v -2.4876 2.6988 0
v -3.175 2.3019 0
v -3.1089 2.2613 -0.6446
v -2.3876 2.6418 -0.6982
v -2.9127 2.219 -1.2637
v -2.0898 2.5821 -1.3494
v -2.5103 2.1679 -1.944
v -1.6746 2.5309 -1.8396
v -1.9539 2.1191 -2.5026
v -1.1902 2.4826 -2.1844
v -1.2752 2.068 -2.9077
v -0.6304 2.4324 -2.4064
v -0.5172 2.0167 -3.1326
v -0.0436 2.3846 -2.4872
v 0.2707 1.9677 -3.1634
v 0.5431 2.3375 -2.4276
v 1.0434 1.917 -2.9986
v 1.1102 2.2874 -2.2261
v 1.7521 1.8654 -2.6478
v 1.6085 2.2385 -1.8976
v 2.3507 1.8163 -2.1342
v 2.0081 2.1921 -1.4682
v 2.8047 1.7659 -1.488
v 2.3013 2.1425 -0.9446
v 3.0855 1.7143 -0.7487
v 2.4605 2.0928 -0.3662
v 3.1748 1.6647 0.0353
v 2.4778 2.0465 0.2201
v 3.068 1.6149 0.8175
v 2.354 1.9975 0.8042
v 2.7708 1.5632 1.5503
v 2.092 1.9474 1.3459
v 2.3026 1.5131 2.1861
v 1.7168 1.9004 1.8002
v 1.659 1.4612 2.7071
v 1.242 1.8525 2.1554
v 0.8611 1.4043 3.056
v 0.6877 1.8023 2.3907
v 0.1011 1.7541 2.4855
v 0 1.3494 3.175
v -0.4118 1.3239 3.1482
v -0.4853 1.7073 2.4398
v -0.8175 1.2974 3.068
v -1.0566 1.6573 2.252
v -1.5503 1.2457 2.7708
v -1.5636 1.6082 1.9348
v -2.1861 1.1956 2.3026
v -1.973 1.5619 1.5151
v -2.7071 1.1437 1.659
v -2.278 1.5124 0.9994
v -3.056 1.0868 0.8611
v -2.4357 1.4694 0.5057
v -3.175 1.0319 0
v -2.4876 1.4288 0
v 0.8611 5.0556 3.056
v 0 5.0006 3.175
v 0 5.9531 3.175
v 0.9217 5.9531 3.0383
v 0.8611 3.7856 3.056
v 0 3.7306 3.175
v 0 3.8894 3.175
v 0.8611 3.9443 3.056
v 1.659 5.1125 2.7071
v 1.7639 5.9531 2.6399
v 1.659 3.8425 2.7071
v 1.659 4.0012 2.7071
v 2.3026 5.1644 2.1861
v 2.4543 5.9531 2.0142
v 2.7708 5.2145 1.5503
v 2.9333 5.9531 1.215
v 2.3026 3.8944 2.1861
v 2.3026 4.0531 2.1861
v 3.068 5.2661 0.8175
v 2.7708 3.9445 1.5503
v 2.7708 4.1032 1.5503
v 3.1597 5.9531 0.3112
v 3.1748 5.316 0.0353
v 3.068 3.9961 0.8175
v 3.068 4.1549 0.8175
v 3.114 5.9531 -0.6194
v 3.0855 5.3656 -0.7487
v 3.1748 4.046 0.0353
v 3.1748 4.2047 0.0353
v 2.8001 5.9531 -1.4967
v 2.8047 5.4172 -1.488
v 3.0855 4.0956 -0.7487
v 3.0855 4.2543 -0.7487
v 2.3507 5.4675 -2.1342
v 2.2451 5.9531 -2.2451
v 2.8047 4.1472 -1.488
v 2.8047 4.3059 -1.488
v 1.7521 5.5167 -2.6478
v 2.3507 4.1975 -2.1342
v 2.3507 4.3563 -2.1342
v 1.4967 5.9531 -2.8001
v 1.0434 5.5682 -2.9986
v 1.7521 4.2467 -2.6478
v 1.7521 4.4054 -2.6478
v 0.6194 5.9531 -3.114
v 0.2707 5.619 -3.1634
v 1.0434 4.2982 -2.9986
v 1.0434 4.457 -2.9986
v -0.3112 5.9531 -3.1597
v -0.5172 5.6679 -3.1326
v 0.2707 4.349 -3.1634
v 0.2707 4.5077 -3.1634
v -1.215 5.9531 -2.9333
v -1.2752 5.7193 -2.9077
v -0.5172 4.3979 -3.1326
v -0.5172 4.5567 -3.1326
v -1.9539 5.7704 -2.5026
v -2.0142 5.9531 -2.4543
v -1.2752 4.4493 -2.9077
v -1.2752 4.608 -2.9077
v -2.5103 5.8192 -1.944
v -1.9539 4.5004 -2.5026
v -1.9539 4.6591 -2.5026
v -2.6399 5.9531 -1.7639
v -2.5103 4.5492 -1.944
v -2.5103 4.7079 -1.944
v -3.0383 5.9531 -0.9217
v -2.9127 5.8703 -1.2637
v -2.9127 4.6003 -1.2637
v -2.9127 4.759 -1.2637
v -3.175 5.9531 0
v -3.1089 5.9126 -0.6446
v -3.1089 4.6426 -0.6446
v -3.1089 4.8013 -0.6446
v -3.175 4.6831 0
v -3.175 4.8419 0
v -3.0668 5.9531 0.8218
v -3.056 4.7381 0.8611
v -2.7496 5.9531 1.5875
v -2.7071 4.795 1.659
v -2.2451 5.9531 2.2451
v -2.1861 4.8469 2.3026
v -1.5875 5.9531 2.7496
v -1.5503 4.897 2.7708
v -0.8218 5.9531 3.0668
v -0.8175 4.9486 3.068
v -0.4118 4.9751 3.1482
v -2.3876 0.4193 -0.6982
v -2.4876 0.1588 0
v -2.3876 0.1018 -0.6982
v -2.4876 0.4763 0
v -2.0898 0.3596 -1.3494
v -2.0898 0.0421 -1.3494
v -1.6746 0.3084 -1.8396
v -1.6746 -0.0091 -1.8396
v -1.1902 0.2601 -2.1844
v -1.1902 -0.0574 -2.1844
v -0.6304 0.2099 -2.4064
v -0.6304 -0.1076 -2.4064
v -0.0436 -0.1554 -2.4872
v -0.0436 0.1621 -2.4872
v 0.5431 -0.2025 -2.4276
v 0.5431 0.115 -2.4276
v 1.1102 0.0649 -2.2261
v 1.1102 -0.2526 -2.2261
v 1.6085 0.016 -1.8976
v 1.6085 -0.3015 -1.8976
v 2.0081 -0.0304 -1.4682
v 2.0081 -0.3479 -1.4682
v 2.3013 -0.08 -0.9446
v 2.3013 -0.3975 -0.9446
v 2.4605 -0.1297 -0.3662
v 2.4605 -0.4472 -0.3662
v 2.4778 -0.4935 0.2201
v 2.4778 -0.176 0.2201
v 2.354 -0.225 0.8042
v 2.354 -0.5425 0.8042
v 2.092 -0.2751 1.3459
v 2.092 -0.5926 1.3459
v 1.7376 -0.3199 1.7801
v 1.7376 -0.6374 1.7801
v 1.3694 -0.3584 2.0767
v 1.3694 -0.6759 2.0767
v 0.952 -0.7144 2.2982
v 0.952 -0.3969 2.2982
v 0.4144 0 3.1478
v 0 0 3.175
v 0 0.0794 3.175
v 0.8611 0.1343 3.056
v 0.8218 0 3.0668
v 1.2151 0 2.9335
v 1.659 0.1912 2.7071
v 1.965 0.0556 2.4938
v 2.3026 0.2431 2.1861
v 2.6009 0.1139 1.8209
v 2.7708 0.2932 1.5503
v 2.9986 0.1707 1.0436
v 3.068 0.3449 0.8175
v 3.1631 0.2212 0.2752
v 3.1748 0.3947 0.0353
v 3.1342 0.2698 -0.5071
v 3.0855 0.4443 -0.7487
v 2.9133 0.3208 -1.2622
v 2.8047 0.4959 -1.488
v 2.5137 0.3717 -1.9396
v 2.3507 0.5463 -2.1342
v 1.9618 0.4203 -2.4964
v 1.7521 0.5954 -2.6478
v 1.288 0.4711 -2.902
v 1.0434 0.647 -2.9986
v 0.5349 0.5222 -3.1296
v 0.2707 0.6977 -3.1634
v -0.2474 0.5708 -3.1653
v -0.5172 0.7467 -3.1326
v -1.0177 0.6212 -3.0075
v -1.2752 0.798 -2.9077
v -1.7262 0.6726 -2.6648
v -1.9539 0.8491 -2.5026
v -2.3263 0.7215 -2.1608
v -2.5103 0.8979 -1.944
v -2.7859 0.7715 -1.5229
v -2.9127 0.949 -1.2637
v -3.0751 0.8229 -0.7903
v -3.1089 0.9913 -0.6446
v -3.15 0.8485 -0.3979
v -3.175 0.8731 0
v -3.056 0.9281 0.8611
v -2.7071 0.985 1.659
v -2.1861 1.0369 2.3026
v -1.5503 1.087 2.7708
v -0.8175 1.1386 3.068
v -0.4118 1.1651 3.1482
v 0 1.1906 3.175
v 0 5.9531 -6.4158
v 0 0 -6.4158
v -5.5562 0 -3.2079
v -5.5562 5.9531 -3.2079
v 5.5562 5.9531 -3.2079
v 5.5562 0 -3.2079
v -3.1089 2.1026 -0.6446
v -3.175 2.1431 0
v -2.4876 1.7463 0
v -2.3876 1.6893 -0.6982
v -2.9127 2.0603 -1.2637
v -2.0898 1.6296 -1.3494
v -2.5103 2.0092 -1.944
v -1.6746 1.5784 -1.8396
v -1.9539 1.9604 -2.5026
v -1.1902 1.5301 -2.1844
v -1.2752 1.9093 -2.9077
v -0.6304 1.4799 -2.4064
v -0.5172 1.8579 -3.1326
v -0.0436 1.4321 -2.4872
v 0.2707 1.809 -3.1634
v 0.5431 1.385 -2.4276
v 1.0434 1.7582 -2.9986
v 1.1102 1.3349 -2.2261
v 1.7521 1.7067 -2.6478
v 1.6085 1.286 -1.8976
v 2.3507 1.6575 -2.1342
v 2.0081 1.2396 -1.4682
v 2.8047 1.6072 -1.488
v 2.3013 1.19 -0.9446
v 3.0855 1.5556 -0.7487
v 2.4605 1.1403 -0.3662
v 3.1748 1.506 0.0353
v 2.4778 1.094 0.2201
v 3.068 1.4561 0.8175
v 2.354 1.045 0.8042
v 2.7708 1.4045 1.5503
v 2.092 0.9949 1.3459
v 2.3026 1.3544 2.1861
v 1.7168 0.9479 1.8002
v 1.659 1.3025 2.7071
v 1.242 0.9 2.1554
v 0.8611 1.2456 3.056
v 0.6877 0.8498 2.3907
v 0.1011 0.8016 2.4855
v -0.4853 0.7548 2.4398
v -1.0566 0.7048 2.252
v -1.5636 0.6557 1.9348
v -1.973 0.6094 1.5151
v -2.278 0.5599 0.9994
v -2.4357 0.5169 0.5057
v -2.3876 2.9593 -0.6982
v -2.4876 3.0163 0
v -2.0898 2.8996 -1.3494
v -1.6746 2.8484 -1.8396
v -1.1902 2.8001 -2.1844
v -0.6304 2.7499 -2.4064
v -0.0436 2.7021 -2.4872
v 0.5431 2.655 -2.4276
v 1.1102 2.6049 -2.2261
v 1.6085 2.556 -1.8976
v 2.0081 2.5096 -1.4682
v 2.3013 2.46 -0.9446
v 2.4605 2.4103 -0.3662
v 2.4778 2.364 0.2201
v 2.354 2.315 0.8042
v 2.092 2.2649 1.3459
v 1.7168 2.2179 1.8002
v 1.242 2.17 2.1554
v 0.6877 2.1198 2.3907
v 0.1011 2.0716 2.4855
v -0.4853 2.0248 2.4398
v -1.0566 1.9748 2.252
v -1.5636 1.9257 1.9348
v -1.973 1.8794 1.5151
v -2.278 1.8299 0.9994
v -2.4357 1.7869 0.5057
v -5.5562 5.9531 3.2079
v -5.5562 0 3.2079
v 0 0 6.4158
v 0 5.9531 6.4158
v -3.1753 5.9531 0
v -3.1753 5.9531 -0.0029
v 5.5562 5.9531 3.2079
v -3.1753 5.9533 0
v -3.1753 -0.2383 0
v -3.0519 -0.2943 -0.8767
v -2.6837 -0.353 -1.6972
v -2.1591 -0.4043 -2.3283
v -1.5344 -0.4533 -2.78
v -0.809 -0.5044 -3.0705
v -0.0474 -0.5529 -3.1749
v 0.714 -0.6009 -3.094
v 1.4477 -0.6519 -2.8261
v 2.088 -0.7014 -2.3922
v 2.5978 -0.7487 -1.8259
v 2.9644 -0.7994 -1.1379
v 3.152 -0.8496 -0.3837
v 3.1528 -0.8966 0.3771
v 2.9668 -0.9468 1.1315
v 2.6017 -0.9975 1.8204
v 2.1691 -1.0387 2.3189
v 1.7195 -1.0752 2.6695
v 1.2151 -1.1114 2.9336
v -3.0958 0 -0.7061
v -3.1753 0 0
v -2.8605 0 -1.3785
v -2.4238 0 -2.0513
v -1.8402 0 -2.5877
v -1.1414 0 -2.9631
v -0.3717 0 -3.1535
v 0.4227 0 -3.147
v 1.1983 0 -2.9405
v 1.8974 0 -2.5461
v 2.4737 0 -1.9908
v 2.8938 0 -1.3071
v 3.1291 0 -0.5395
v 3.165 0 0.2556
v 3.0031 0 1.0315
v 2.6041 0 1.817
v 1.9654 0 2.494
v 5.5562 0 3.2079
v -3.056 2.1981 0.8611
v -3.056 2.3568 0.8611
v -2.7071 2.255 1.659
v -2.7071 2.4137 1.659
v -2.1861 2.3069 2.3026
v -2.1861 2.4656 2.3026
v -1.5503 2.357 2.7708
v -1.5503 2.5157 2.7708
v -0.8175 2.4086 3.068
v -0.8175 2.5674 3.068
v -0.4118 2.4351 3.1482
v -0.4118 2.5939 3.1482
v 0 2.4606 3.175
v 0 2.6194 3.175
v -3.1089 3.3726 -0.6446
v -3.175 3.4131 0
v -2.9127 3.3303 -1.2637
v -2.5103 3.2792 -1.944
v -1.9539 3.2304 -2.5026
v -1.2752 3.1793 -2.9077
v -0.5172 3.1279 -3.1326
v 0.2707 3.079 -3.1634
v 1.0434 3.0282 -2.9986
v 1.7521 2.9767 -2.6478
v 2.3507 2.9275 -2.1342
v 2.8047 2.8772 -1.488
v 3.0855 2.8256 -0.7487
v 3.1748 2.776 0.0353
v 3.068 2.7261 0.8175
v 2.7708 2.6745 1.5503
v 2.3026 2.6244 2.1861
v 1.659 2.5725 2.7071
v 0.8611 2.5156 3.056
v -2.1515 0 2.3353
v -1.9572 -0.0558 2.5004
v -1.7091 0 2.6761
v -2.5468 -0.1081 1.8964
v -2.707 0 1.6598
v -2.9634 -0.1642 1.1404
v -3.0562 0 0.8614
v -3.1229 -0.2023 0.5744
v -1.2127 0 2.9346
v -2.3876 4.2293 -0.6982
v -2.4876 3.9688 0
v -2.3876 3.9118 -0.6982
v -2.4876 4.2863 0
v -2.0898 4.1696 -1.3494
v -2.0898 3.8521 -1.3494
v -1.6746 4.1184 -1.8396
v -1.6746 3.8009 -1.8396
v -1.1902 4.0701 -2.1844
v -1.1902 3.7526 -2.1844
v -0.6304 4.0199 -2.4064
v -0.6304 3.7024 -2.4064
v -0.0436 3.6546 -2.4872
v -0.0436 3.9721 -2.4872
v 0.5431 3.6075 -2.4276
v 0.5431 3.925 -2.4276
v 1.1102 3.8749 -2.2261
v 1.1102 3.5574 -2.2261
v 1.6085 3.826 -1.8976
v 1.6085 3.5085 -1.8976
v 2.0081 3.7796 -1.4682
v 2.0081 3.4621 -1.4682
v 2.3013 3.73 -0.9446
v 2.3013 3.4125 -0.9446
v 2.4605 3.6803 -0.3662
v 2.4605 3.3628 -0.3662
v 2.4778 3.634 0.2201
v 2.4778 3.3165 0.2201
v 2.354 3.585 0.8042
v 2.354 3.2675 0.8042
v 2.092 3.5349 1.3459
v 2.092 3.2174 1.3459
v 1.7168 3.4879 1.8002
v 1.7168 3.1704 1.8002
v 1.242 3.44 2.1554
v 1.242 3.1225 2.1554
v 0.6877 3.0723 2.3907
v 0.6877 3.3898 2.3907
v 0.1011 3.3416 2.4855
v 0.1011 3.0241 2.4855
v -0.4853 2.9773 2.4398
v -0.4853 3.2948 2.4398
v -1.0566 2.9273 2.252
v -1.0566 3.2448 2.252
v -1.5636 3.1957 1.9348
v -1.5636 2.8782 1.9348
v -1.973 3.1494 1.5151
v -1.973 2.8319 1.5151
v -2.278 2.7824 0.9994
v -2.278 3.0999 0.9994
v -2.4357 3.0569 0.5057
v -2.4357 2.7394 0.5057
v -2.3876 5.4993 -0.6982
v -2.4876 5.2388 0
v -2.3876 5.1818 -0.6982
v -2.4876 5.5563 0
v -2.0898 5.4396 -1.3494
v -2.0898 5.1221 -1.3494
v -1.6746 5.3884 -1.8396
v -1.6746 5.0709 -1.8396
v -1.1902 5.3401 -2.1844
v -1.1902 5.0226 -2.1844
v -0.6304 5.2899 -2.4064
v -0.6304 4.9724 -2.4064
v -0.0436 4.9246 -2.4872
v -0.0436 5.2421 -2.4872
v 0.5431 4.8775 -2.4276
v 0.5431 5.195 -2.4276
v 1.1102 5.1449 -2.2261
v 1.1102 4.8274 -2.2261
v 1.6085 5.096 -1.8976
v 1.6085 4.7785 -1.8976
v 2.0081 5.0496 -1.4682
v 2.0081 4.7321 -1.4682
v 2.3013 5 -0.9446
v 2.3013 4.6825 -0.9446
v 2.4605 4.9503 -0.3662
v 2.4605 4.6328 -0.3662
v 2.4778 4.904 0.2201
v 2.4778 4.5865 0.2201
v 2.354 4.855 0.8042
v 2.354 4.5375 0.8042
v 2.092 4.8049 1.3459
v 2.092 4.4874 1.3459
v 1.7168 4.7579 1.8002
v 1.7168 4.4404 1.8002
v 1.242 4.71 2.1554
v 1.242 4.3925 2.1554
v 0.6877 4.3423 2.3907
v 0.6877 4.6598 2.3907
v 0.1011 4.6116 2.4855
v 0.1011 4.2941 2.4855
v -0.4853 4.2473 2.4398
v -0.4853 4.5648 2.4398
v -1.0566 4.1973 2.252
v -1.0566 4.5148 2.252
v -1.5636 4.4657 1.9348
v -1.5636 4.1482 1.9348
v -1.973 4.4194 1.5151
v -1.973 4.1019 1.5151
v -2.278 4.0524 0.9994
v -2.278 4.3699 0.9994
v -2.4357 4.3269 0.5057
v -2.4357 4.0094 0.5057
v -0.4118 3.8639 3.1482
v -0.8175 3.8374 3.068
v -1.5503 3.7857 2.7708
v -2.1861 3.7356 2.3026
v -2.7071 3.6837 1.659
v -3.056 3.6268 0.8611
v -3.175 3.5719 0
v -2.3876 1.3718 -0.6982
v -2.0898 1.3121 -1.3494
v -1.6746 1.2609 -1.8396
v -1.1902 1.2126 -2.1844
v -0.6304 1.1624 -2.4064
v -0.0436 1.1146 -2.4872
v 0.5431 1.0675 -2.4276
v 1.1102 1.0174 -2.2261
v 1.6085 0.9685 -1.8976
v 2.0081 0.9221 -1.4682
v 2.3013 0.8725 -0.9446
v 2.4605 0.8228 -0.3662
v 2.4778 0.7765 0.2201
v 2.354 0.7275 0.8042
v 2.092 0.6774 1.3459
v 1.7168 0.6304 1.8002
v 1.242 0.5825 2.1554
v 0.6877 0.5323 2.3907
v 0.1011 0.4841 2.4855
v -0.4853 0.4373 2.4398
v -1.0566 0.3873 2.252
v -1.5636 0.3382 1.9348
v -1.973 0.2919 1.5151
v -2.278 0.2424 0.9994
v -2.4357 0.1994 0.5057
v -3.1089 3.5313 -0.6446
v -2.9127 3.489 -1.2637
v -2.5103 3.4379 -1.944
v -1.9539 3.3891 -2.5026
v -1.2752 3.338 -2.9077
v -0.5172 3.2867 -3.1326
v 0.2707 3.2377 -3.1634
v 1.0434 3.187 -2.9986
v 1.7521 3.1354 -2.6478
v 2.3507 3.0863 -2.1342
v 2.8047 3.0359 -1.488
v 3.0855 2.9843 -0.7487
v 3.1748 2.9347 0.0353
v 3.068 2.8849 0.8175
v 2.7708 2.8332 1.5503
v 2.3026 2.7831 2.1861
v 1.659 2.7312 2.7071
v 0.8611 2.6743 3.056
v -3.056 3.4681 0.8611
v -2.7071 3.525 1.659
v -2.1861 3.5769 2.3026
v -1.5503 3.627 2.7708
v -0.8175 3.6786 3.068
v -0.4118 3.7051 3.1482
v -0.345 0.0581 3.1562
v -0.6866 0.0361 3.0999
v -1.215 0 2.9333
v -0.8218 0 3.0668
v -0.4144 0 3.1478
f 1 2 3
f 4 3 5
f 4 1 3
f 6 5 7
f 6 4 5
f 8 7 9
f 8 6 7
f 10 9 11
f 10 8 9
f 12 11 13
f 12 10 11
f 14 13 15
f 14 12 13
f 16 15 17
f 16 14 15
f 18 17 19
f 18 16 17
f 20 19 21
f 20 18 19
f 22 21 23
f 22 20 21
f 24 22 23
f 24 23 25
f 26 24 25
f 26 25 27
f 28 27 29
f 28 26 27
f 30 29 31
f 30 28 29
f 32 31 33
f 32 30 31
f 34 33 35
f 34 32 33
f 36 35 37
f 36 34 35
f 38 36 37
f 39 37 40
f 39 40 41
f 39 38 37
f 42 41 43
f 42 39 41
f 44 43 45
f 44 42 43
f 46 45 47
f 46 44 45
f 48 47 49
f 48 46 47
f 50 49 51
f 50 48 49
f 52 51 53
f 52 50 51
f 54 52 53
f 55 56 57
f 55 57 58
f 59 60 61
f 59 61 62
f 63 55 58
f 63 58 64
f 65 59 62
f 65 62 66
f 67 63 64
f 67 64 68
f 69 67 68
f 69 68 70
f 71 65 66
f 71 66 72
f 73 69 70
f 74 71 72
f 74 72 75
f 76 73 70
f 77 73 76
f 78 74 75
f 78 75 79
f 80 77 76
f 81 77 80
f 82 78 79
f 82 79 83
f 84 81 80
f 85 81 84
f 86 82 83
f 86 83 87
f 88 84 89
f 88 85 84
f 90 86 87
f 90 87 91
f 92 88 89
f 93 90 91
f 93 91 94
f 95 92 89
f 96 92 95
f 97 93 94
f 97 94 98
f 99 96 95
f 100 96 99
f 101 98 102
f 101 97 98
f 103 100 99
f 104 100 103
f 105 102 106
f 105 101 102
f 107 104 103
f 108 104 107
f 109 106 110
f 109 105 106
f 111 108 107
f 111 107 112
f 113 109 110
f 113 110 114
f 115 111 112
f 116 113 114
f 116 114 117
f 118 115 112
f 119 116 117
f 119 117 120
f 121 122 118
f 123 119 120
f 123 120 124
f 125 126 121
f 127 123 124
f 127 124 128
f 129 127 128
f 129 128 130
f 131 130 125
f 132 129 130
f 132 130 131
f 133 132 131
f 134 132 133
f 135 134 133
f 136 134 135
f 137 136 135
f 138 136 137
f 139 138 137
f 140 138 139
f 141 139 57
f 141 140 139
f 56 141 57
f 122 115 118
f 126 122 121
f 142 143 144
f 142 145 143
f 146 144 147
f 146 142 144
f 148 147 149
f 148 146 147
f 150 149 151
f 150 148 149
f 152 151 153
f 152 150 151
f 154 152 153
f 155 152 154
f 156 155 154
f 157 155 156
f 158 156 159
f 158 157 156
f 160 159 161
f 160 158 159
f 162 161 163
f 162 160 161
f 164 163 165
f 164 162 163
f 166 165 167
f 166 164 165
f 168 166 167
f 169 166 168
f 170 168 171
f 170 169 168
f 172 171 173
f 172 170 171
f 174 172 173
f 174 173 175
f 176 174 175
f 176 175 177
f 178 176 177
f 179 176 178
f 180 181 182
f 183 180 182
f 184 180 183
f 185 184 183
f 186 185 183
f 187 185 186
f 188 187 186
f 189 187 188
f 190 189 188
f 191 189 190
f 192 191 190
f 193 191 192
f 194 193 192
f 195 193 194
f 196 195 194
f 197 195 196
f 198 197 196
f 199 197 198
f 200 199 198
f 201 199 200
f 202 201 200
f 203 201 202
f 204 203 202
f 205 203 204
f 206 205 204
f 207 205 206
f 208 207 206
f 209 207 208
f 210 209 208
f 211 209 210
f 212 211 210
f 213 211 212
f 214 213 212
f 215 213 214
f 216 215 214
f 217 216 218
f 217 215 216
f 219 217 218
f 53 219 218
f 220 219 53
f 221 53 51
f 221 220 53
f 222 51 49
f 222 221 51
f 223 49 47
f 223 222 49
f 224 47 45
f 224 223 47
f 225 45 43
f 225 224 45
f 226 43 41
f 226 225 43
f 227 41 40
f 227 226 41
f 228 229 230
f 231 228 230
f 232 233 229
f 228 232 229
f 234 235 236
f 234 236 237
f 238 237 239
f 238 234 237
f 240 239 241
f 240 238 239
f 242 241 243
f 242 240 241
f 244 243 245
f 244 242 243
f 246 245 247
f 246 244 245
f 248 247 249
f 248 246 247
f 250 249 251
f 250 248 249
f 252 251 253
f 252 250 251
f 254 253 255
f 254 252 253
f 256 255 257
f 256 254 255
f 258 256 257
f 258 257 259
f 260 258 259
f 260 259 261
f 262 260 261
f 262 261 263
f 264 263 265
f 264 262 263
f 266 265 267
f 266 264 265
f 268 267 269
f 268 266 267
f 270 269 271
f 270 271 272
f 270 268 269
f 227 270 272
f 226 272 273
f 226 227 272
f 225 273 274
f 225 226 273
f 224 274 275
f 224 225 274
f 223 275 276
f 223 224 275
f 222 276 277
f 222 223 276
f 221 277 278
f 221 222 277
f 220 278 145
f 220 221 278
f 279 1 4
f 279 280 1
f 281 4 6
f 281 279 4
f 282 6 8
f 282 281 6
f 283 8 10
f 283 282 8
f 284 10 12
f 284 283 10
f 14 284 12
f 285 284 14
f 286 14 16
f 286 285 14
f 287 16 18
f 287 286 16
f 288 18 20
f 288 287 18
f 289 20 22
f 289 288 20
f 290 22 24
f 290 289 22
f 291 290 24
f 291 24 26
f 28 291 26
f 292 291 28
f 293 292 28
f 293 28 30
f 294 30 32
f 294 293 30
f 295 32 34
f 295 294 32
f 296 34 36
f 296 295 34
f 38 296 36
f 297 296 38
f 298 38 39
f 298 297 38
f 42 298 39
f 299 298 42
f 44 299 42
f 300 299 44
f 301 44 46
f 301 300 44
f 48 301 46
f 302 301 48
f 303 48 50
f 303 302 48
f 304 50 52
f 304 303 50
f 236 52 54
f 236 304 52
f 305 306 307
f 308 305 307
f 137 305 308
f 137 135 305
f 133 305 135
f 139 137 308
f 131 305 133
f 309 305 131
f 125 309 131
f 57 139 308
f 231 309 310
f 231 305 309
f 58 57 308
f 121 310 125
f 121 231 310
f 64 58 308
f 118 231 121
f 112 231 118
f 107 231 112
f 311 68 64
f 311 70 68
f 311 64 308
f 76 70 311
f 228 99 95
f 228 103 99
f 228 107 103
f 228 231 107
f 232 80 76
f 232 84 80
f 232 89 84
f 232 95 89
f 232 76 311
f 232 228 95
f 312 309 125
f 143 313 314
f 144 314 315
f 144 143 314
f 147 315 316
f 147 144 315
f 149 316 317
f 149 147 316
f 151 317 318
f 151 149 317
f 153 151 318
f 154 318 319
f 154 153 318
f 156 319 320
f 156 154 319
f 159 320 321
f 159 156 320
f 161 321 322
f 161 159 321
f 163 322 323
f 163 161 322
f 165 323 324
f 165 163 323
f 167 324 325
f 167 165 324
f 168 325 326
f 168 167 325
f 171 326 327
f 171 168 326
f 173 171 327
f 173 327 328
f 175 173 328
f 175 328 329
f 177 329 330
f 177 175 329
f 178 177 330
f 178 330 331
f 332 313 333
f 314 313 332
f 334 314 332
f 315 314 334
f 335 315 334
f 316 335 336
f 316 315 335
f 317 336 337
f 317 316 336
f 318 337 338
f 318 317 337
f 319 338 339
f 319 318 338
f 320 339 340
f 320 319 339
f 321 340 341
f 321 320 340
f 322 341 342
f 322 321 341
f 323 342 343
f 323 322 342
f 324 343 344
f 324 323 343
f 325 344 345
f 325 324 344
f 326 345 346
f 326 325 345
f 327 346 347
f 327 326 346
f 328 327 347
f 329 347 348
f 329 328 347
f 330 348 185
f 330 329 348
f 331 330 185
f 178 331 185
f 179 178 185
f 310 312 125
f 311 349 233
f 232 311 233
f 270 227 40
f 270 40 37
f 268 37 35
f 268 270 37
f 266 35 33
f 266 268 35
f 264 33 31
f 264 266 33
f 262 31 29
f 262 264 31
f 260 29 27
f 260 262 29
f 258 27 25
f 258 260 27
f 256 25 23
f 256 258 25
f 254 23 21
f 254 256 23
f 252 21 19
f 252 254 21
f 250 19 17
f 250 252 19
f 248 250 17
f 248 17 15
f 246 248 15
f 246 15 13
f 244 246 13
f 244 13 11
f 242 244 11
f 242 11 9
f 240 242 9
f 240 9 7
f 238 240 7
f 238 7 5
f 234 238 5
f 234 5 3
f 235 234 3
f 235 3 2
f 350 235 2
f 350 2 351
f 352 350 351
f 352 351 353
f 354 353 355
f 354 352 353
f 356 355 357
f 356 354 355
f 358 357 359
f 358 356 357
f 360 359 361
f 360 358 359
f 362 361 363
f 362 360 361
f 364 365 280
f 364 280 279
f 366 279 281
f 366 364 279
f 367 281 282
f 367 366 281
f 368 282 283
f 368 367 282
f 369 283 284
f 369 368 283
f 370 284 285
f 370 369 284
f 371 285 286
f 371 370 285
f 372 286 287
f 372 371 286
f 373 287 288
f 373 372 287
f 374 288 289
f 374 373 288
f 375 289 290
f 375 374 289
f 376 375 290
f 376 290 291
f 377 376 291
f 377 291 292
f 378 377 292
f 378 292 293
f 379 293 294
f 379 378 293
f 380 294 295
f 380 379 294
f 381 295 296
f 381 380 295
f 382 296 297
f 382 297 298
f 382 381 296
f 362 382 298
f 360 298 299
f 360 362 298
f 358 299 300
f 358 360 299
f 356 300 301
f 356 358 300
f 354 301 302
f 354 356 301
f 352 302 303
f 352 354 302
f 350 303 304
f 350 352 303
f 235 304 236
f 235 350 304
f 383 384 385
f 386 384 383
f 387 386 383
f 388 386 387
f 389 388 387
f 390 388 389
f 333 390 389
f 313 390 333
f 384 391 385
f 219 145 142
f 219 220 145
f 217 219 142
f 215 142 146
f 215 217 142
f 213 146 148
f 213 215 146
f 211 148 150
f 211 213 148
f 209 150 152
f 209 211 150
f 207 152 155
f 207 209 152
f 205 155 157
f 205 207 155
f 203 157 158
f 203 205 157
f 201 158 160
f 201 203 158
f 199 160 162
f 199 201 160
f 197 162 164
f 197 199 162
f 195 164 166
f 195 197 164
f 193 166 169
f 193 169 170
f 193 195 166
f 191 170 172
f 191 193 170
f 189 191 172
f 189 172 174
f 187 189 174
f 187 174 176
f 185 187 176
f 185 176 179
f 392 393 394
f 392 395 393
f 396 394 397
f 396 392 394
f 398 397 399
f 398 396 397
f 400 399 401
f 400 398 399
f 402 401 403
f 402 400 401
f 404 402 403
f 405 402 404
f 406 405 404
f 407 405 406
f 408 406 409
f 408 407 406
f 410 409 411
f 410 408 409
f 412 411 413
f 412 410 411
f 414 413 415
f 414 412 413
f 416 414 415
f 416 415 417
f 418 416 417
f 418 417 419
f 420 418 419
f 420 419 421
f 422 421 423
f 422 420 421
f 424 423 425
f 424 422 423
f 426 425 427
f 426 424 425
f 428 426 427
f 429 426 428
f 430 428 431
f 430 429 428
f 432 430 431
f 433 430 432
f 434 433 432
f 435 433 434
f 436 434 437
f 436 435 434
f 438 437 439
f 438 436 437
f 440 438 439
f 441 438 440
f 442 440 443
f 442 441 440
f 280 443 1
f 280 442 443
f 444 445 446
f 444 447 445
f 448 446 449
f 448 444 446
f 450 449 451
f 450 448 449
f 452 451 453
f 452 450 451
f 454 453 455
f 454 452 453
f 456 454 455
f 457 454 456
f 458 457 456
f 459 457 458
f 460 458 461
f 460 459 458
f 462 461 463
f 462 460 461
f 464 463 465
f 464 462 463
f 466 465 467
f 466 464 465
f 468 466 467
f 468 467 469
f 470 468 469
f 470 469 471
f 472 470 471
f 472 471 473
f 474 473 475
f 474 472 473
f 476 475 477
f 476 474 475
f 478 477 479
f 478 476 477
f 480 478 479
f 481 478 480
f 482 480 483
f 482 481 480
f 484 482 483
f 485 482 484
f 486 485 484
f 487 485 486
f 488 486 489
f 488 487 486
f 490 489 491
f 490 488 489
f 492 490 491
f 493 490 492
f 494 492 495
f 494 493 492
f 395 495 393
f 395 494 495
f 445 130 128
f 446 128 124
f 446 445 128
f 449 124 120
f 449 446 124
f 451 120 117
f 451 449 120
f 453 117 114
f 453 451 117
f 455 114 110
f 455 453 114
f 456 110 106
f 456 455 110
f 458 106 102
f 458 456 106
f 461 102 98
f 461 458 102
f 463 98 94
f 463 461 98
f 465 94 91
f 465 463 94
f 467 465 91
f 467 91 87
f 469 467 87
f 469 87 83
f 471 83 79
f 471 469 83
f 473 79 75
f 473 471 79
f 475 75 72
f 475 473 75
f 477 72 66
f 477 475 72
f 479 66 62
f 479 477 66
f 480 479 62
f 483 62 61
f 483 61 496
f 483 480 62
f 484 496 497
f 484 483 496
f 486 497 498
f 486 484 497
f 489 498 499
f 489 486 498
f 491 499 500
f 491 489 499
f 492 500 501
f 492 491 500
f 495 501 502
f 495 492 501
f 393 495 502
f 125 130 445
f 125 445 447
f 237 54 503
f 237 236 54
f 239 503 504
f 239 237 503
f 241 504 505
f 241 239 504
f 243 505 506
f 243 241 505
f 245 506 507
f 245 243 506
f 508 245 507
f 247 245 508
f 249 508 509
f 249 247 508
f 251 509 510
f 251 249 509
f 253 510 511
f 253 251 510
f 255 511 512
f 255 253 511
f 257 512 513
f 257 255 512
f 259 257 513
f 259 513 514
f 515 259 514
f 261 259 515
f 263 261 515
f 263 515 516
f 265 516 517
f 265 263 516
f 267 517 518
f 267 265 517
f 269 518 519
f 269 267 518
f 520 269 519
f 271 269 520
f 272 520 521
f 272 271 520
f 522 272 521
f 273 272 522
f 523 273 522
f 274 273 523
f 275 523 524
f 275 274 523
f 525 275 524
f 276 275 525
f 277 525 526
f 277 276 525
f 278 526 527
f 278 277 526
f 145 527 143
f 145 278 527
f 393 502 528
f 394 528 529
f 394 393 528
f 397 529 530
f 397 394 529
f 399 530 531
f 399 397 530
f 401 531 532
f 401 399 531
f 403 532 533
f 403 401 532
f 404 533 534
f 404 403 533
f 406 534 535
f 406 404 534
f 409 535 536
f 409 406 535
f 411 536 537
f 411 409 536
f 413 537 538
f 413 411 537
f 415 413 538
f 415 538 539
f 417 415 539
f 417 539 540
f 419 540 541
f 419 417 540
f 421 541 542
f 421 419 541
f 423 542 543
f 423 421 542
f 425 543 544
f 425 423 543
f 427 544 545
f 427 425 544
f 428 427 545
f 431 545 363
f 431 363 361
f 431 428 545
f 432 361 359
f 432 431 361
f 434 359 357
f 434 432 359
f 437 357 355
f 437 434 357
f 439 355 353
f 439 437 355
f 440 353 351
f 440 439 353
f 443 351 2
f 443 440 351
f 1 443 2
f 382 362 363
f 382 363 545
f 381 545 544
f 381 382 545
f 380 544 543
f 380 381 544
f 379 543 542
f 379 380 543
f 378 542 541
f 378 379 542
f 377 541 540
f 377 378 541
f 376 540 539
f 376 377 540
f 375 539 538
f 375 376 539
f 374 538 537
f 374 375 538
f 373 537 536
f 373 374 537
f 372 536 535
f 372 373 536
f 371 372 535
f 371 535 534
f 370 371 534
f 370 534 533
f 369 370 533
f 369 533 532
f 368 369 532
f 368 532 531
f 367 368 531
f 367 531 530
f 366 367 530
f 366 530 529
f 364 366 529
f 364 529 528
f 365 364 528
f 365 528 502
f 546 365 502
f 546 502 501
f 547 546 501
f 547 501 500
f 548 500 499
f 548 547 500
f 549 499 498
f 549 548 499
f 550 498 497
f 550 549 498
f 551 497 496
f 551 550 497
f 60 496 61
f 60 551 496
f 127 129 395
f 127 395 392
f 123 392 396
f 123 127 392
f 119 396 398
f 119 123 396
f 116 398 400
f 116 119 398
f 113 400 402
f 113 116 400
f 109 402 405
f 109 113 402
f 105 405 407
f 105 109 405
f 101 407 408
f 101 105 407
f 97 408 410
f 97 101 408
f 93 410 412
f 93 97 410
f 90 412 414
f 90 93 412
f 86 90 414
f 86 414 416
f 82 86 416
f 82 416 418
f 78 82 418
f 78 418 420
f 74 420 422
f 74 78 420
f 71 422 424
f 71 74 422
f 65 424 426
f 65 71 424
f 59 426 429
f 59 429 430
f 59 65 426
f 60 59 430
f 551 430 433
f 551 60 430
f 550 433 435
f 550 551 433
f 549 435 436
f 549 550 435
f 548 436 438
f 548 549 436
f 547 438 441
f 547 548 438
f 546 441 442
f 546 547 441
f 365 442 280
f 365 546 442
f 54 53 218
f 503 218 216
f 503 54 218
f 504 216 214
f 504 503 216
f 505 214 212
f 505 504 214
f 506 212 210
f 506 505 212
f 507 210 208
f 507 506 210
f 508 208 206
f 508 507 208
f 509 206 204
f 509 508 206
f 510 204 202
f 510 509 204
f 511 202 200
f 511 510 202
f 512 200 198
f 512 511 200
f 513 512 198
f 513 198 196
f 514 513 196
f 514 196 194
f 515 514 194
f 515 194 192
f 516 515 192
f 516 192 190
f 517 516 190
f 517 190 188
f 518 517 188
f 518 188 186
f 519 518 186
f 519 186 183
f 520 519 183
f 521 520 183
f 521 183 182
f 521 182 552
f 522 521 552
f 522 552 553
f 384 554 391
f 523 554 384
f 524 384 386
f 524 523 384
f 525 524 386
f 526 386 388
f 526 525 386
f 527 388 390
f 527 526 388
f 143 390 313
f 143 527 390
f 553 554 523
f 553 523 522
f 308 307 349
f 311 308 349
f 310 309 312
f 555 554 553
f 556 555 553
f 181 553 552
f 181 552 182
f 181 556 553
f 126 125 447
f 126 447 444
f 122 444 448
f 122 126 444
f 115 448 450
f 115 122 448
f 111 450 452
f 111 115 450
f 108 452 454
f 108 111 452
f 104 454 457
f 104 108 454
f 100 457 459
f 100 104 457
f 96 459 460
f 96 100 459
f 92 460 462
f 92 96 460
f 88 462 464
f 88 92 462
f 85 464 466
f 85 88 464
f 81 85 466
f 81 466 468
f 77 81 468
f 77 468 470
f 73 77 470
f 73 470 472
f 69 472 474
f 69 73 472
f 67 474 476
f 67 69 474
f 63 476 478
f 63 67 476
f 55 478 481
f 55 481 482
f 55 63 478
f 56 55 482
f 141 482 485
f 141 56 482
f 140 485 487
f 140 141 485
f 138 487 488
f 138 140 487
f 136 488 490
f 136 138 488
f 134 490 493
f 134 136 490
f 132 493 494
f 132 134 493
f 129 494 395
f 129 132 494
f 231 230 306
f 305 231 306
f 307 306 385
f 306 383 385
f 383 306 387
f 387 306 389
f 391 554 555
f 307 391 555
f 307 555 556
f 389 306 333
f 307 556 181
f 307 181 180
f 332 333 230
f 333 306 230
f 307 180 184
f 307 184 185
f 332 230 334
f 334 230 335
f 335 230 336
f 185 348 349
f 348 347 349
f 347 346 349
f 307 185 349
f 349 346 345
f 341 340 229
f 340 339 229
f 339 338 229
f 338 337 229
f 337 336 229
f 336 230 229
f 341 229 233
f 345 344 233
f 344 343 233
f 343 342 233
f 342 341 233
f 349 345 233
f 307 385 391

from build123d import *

# Parameters (mm, degrees)
SKETCH1_R           = 3.175
BOSS_EXTRUDE1_DEPTH = 5.953125
THREAD1_PITCH       = 1.27


with BuildPart() as part:
    # Sketch1 → Boss-Extrude1 (new body)
    with BuildSketch(Plane(origin=(0, 0, 0), x_dir=(1, 0, 0), z_dir=(0, 1, 0))):
        Polygon((0, 6.415804866), (-5.55625, 3.207902433), (-5.55625, -3.207902433), (0, -6.415804866), (5.55625, -3.207902433), (5.55625, 3.207902433), align=None)
        with Locations(Location((0, 0, 0), (0, 0, 270))):
            Circle(SKETCH1_R, mode=Mode.SUBTRACT)
    extrude(amount=BOSS_EXTRUDE1_DEPTH)

    # Thread1: the profile of Thread Profile1 profile screwed along a right-hand helix of 4.6875 turns, 8 arcs to a turn; built about Z, then put on its axis
    thread1_z = Axis((0, 0, 0), (0, 0, 1))
    thread1_corners = [(3.1753, 0, -0.000173205), (3.1753, 0, 1.111423202), (2.487592339, 0, 0.714374998), (2.487592339, 0, 0.396874998)]
    with BuildLine(mode=Mode.PRIVATE) as thread1_profile:
        Line(thread1_corners[0], thread1_corners[1])
        Line(thread1_corners[1], thread1_corners[2])
        Line(thread1_corners[2], thread1_corners[3])
        Line(thread1_corners[3], thread1_corners[0])
    thread1_cap = Face(thread1_profile.wire())
    thread1_turn_angles = [0, 22.5, 45, 67.5, 90, 112.5, 135, 157.5, 180, 202.5, 225, 247.5, 270, 292.5, 315, 337.5, 360]
    thread1_turn_weights = [1, 0.9238795325112867, 1, 0.9238795325112867, 1, 0.9238795325112867, 1, 0.9238795325112867, 1, 0.9238795325112867, 1, 0.9238795325112867, 1, 0.9238795325112867, 1, 0.9238795325112867, 1]
    thread1_turn_rails = [Edge.make_bspline([Vector(p[0], p[1], 0).rotate(thread1_z, thread1_turn_angles[k]) / thread1_turn_weights[k] + Vector(0, 0, p[2] + THREAD1_PITCH * thread1_turn_angles[k] / 360) for k in range(17)], [0, 0, 0, 1, 1, 2, 2, 3, 3, 4, 4, 5, 5, 6, 6, 7, 7, 8, 8, 8], 2, thread1_turn_weights) for p in thread1_corners]
    thread1_turn_sides = [Face.make_surface_from_curves(thread1_turn_rails[p[0]], thread1_turn_rails[p[1]]) for p in [(0, 1), (1, 2), (2, 3), (3, 0)]]
    thread1_last_angles = [1440, 1462.5, 1485, 1507.5, 1530, 1552.5, 1575, 1597.5, 1620, 1642.5, 1665, 1676.25, 1687.5]
    thread1_last_weights = [1, 0.9238795325112867, 1, 0.9238795325112867, 1, 0.9238795325112867, 1, 0.9238795325112867, 1, 0.9238795325112867, 1, 0.9807852804032304, 1]
    thread1_last_rails = [Edge.make_bspline([Vector(p[0], p[1], 0).rotate(thread1_z, thread1_last_angles[k]) / thread1_last_weights[k] + Vector(0, 0, p[2] + THREAD1_PITCH * thread1_last_angles[k] / 360) for k in range(13)], [0, 0, 0, 1, 1, 2, 2, 3, 3, 4, 4, 5, 5, 6, 6, 6], 2, thread1_last_weights) for p in thread1_corners]
    thread1_last_sides = [Face.make_surface_from_curves(thread1_last_rails[p[0]], thread1_last_rails[p[1]]) for p in [(0, 1), (1, 2), (2, 3), (3, 0)]]
    thread1 = Plane(origin=(0, 5.953125, 0), x_dir=(-1, 0, 0), z_dir=(0, -1, 0)) * Solid(Shell([*[p.moved(Location((0, 0, THREAD1_PITCH * i))) for i in range(4) for p in thread1_turn_sides], *thread1_last_sides, thread1_cap, thread1_cap.rotate(thread1_z, 1687.5).moved(Location((0, 0, THREAD1_PITCH * 1687.5 / 360)))]))
    add(thread1)


solid = part.part
